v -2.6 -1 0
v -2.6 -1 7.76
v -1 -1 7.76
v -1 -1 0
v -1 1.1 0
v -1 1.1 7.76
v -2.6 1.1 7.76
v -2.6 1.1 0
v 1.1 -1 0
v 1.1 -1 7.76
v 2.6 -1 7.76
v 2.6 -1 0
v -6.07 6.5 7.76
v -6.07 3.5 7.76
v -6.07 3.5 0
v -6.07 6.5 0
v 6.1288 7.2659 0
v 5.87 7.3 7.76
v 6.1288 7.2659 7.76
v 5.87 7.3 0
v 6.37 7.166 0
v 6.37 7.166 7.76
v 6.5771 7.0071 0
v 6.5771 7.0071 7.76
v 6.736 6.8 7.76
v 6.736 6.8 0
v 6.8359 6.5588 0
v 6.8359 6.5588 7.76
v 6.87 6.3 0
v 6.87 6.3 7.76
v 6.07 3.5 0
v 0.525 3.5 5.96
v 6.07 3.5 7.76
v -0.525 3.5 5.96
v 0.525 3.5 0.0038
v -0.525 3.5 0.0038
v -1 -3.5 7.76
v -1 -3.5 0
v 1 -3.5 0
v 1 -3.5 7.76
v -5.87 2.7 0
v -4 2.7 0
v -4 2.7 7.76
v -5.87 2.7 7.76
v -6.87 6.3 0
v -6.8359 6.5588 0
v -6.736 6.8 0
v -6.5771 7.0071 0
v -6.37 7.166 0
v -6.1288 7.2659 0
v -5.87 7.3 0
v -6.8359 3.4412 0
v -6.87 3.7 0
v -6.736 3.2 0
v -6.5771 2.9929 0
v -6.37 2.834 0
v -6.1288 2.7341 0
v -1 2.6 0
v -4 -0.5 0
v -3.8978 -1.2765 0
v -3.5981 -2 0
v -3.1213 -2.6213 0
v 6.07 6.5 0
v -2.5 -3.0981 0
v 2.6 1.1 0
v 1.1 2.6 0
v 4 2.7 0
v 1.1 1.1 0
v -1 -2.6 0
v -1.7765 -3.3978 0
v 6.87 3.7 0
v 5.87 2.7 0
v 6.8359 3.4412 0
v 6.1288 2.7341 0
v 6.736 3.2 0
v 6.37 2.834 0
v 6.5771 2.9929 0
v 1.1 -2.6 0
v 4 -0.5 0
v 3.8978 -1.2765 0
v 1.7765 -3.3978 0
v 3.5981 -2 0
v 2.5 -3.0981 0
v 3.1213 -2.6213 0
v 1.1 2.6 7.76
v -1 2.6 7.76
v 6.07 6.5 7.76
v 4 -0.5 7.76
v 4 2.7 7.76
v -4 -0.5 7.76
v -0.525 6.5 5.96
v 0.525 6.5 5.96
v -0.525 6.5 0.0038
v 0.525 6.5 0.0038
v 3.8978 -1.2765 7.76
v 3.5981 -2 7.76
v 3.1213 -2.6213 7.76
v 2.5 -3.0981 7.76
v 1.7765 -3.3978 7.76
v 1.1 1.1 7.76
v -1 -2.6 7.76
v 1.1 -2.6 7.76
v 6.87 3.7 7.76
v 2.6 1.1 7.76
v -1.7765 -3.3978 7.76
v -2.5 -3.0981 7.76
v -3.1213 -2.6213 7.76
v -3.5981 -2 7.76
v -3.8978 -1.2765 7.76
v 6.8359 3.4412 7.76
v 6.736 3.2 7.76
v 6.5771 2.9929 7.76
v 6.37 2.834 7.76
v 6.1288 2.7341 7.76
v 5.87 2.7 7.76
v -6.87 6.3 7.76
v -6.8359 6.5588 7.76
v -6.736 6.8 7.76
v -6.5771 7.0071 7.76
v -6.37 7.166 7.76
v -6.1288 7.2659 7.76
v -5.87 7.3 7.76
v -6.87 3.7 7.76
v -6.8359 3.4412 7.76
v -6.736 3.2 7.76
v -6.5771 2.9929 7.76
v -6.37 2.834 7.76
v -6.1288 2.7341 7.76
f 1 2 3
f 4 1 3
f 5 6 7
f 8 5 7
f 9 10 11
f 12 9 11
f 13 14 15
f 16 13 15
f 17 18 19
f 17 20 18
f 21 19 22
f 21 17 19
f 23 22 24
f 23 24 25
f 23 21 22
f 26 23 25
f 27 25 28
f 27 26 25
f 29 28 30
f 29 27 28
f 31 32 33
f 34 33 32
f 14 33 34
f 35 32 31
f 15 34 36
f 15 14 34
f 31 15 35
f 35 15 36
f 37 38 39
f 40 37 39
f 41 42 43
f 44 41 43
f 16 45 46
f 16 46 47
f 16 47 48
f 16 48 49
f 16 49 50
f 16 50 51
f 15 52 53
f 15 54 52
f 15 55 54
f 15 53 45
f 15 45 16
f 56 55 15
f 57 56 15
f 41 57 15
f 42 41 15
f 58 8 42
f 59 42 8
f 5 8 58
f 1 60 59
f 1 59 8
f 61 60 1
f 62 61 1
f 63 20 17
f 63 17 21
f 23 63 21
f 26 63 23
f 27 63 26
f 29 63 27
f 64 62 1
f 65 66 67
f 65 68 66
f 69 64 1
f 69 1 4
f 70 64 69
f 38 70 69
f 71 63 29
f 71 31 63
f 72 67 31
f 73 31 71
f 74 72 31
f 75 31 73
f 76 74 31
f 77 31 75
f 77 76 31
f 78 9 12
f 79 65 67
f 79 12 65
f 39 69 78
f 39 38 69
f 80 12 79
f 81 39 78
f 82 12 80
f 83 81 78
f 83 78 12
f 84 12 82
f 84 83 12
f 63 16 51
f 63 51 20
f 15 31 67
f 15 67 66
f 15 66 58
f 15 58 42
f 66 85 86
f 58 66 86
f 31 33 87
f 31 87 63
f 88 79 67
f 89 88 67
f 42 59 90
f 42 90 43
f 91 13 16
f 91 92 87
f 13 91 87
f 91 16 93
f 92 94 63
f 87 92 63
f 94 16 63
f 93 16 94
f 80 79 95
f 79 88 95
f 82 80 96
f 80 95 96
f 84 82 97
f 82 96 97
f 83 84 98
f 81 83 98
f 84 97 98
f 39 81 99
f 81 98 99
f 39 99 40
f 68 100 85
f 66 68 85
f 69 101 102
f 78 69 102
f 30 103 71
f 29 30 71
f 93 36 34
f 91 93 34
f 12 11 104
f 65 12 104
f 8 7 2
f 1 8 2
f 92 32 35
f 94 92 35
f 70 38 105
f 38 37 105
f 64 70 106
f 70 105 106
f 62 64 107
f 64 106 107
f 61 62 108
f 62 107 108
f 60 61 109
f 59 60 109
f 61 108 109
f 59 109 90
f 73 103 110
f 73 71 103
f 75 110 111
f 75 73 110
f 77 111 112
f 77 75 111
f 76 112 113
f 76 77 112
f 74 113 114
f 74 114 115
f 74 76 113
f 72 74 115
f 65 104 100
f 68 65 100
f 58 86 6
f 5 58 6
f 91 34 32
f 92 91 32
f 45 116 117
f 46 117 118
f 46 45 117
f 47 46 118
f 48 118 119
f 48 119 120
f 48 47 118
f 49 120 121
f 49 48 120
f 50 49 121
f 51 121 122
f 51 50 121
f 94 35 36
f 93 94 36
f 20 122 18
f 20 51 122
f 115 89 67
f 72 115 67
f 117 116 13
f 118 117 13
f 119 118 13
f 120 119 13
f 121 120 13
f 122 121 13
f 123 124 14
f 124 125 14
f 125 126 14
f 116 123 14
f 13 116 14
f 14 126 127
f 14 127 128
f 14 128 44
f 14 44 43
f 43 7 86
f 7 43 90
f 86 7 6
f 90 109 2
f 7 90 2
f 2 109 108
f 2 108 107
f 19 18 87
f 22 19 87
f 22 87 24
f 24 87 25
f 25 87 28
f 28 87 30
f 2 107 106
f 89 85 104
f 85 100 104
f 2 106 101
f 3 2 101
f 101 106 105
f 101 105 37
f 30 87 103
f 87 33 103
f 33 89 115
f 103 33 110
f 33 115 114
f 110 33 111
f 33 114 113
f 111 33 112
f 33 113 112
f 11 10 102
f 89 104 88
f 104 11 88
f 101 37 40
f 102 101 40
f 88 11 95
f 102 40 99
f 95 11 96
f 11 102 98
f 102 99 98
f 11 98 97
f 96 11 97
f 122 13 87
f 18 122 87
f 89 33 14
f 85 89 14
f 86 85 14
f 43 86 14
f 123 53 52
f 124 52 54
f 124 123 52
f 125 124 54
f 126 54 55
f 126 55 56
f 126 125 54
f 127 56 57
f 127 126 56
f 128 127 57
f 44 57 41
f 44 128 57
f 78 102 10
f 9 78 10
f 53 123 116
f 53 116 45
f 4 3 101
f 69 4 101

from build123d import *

# Parameters (mm, degrees)
SKETCH1_W           = 8
SKETCH1_H           = 7
BOSS_EXTRUDE1_DEPTH = 7.76
CUT_EXTRUDE3_DEPTH  = 8.76
SKETCH7_W           = 7.76
SKETCH7_H           = 0.8
BOSS_EXTRUDE2_DEPTH = 2.87
SKETCH9_W           = 7.76
SKETCH9_H           = 0.8
BOSS_EXTRUDE3_DEPTH = 2.87
SKETCH10_W          = 0.8
SKETCH10_H          = 7.76
BOSS_EXTRUDE4_DEPTH = 3
SKETCH11_W          = 0.8
SKETCH11_H          = 7.76
BOSS_EXTRUDE5_DEPTH = 3
SKETCH12_W          = 13.74
SKETCH12_H          = 7.76
BOSS_EXTRUDE6_DEPTH = 0.8
BOSS_EXTRUDE7_REACH = 5.8
FILLET4_R           = 1
FILLET5_R           = 1
FILLET6_R           = 1
FILLET7_R           = 1
FILLET8_R           = 3
FILLET9_R           = 3


with BuildPart() as part:
    # Sketch1 → Boss-Extrude1 (new body)
    with BuildSketch(Plane.XY):
        Rectangle(SKETCH1_W, SKETCH1_H)
    extrude(amount=BOSS_EXTRUDE1_DEPTH)

    # Sketch6 → Cut-Extrude3 (cut, through all)
    with BuildSketch(Plane.XY.offset(7.76)):
        Polygon((1.1, -1), (2.6, -1), (2.6, 1.1), (1.1, 1.1), (1.1, 2.6), (-1, 2.6), (-1, 1.1), (-2.6, 1.1), (-2.6, -1), (-1, -1), (-1, -2.6), (1.1, -2.6), align=None)
    extrude(amount=-CUT_EXTRUDE3_DEPTH, mode=Mode.SUBTRACT)

    # Sketch7 → Boss-Extrude2 (add)
    with BuildSketch(Plane.ZY.offset(4)):
        with Locations((3.88, 3.1)):
            Rectangle(SKETCH7_W, SKETCH7_H)
    extrude(amount=BOSS_EXTRUDE2_DEPTH)

    # Sketch9 → Boss-Extrude3 (add)
    with BuildSketch(Plane(origin=(4, 0, 0), x_dir=(0, 0, -1), z_dir=(1, 0, 0))):
        with Locations((-3.88, 3.1)):
            Rectangle(SKETCH9_W, SKETCH9_H)
    extrude(amount=BOSS_EXTRUDE3_DEPTH)

    # Sketch10 → Boss-Extrude4 (add)
    with BuildSketch(Plane(origin=(0, 3.5, 0), x_dir=(1, 0, 0), z_dir=(0, 1, 0))):
        with Locations((6.47, -3.88)):
            Rectangle(SKETCH10_W, SKETCH10_H)
    extrude(amount=BOSS_EXTRUDE4_DEPTH)

    # Sketch11 → Boss-Extrude5 (add)
    with BuildSketch(Plane(origin=(0, 3.5, 0), x_dir=(1, 0, 0), z_dir=(0, 1, 0))):
        with Locations((-6.47, -3.88)):
            Rectangle(SKETCH11_W, SKETCH11_H)
    extrude(amount=BOSS_EXTRUDE5_DEPTH)

    # Sketch12 → Boss-Extrude6 (add)
    with BuildSketch(Plane(origin=(0, 6.5, 0), x_dir=(1, 0, 0), z_dir=(0, 1, 0))):
        with Locations((0, -3.88)):
            Rectangle(SKETCH12_W, SKETCH12_H)
    extrude(amount=BOSS_EXTRUDE6_DEPTH)

    # Sketch14 → Boss-Extrude7 (add, up to next)
    with BuildSketch(Plane(origin=(0, 3.5, 0), x_dir=(1, 0, 0), z_dir=(0, 1, 0)), mode=Mode.PRIVATE) as boss_extrude7_sk1:
        Polygon((0.525000003, -0.003794521), (-0.524999997, -0.003794521), (-0.524994746, -5.96), (0.525005254, -5.96), align=None)
    boss_extrude7_tool1 = extrude(boss_extrude7_sk1.sketch, amount=BOSS_EXTRUDE7_REACH, mode=Mode.PRIVATE) - part.part
    add(boss_extrude7_tool1.solids().sort_by_distance((3e-06, 3.5, 2.981897))[0])

    # Fillet4
    fillet4_edges = [part.edges().sort_by_distance(p)[0] for p in [
        (-6.87, 7.3, 3.88),
    ]]
    fillet(fillet4_edges, radius=FILLET4_R)

    # Fillet5
    fillet5_edges = [part.edges().sort_by_distance(p)[0] for p in [
        (6.87, 7.3, 3.88),
    ]]
    fillet(fillet5_edges, radius=FILLET5_R)

    # Fillet6
    fillet6_edges = [part.edges().sort_by_distance(p)[0] for p in [
        (-6.87, 2.7, 3.88),
    ]]
    fillet(fillet6_edges, radius=FILLET6_R)

    # Fillet7
    fillet7_edges = [part.edges().sort_by_distance(p)[0] for p in [
        (6.87, 2.7, 3.88),
    ]]
    fillet(fillet7_edges, radius=FILLET7_R)

    # Fillet8
    fillet8_edges = [part.edges().sort_by_distance(p)[0] for p in [
        (4, -3.5, 3.88),
    ]]
    fillet(fillet8_edges, radius=FILLET8_R)

    # Fillet9
    fillet9_edges = [part.edges().sort_by_distance(p)[0] for p in [
        (-4, -3.5, 3.88),
    ]]
    fillet(fillet9_edges, radius=FILLET9_R)


solid = part.part
